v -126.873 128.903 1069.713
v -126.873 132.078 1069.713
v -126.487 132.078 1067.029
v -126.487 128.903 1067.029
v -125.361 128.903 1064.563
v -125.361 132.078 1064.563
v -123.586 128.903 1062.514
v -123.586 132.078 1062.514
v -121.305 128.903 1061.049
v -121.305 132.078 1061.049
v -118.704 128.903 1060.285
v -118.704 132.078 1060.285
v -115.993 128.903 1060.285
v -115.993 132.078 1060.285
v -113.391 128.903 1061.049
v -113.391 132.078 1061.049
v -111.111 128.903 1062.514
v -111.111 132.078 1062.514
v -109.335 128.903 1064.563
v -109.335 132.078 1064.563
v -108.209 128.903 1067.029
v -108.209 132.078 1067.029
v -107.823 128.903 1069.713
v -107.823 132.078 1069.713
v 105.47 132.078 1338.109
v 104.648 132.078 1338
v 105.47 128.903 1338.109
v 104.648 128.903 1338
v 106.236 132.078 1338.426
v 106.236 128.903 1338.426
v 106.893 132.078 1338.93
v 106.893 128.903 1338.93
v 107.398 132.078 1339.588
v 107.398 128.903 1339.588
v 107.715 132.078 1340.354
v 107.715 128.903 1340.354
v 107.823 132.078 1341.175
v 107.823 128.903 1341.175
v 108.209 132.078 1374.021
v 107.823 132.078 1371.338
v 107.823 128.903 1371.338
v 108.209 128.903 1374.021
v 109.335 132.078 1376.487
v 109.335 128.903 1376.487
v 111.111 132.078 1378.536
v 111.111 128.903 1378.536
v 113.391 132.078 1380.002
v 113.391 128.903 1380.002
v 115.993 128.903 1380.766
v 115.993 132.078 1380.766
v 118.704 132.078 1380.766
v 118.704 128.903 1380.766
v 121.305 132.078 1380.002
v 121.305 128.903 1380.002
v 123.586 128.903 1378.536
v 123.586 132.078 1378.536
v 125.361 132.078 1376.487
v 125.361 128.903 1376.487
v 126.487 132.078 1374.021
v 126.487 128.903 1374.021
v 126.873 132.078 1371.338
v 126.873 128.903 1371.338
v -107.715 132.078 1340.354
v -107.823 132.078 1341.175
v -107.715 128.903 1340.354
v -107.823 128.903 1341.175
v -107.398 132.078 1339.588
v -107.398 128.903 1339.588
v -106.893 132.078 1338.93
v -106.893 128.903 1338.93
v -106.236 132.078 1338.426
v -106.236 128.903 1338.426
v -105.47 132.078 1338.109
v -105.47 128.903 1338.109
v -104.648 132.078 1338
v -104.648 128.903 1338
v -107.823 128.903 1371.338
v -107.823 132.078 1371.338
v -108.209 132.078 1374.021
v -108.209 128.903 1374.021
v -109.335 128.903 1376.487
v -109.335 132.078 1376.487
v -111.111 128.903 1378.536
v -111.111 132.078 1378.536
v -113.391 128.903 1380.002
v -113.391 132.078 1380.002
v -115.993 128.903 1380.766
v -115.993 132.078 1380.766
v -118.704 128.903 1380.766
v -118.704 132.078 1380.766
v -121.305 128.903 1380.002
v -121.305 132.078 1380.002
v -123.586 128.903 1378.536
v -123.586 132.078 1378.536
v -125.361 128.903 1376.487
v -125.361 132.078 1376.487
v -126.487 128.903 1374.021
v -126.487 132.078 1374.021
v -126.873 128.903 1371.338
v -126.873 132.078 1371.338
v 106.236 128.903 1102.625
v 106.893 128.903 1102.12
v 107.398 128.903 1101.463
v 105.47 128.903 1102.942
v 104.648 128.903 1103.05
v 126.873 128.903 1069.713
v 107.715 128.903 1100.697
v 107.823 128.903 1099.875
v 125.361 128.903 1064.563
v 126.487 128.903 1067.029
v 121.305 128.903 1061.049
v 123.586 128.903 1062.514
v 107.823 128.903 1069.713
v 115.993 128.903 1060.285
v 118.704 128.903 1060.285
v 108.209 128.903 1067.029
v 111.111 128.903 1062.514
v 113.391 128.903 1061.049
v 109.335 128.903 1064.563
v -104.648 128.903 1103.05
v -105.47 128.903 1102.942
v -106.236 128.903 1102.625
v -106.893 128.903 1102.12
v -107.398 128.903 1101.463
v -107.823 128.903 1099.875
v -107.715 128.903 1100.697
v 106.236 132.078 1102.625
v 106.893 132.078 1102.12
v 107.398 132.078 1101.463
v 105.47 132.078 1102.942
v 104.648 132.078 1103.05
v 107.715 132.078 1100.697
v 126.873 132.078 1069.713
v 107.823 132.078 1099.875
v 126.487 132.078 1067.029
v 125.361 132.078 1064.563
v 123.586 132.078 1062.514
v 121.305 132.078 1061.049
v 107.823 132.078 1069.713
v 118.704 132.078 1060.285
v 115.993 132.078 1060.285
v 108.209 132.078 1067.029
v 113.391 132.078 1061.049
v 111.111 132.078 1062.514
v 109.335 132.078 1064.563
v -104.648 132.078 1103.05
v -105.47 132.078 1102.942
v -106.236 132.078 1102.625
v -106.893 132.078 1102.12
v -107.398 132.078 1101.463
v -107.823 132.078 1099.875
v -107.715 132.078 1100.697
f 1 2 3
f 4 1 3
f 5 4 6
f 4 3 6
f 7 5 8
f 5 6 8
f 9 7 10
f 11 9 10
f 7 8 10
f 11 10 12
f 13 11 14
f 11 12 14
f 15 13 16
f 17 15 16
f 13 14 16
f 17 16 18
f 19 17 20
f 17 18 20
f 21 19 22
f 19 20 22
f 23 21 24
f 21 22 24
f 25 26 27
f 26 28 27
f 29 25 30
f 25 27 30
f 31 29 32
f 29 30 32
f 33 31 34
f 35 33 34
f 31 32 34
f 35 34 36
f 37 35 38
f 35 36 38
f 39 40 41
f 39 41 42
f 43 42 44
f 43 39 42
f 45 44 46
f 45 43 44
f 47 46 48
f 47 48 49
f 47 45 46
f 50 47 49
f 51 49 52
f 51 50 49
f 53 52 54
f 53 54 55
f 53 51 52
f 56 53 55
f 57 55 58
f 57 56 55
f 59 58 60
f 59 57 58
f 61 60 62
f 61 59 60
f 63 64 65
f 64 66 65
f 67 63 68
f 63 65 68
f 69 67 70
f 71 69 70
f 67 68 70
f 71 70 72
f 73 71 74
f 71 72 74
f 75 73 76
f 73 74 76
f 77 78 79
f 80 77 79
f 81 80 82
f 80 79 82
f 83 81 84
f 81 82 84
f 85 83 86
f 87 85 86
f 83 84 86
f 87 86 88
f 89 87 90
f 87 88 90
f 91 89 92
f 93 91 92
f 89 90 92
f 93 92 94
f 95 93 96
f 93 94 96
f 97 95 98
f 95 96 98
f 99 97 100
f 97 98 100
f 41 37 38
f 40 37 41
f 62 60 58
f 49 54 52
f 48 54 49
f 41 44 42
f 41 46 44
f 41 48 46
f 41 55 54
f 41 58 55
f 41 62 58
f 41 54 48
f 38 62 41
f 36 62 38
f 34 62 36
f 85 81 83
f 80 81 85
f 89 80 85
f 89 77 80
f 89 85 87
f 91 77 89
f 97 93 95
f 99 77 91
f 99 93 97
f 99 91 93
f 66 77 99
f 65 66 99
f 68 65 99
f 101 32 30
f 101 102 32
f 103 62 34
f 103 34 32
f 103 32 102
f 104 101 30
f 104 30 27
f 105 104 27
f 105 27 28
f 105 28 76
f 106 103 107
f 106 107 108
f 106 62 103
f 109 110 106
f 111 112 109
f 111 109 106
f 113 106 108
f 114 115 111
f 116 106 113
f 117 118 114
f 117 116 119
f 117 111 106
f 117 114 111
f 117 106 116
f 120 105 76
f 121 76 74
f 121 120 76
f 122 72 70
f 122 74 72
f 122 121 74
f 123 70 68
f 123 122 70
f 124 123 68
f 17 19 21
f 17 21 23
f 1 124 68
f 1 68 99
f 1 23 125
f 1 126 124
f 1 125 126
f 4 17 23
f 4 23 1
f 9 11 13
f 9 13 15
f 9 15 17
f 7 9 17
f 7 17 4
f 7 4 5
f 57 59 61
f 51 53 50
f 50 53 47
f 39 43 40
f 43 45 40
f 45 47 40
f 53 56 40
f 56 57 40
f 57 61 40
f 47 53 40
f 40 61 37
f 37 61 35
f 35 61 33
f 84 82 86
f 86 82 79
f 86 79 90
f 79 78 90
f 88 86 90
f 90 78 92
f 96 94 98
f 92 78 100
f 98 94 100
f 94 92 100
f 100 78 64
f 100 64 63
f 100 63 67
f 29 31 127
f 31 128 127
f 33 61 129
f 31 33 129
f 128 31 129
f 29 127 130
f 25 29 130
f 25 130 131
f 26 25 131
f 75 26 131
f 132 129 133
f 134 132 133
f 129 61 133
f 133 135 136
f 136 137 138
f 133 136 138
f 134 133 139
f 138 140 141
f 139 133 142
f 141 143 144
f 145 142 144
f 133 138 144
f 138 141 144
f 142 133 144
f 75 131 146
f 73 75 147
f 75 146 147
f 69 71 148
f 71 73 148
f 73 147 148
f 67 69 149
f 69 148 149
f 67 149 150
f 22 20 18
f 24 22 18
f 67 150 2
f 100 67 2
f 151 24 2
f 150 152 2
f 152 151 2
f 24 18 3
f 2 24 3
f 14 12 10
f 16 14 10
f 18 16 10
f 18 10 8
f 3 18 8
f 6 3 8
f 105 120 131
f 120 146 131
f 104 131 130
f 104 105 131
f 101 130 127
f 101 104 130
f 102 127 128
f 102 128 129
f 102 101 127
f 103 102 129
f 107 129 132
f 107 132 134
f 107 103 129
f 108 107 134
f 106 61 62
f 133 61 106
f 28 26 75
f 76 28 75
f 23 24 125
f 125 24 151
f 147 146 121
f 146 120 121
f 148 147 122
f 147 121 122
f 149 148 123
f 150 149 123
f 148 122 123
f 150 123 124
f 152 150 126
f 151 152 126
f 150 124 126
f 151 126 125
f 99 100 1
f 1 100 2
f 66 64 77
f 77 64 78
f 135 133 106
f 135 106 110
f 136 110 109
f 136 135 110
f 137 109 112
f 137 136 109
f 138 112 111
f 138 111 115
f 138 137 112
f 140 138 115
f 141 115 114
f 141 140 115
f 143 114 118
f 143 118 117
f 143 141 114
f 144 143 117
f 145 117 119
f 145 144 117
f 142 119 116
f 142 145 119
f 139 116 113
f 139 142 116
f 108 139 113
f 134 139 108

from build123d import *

# Parameters (mm, degrees)
BOSS_EXTRUDE1_START = 12.827
BOSS_EXTRUDE1_DEPTH = 3.175
FILLET1_R           = 3.175


with BuildPart() as part:
    # Sketch1 → Boss-Extrude1 (new body)
    with BuildSketch(Plane(origin=(0, 144.904574554, 0), x_dir=(-1, 0, 0), z_dir=(0, -1, 0)).offset(BOSS_EXTRUDE1_START)):
        with BuildLine():
            Line((-107.823062484, -1103.050334154), (0, -1103.050334154))
            Line((0, -1103.050334154), (0, -1338.000334154))
            Line((0, -1338.000334154), (-107.823062484, -1338.000334154))
            Line((-107.823062484, -1338.000334154), (-107.823062484, -1371.337834154))
            ThreePointArc((-107.823062484, -1371.337834154), (-117.348062484, -1380.862834154), (-126.873062484, -1371.337834154))
            Line((-126.873062484, -1371.337834154), (-126.873062484, -1069.712834154))
            ThreePointArc((-126.873062484, -1069.712834154), (-117.348062484, -1060.187834154), (-107.823062484, -1069.712834154))
            Line((-107.823062484, -1069.712834154), (-107.823062484, -1103.050334154))
        make_face()
    extrude(amount=BOSS_EXTRUDE1_DEPTH)

    # Mirror1: part across plane


with BuildPart() as part_1:
    add(part.part)
    add(part.part.mirror(Plane(origin=(0, 0, 0), x_dir=(0, 0, 1), z_dir=(1, 0, 0))))

    # Fillet1
    fillet1_edges = [part_1.edges().sort_by_distance(p)[0] for p in [
        (107.823062484, 130.490074554, 1103.050334154),
        (107.823062484, 130.490074554, 1338.000334154),
        (-107.823062484, 130.490074554, 1338.000334154),
        (-107.823062484, 130.490074554, 1103.050334154),
    ]]
    fillet(fillet1_edges, radius=FILLET1_R)


solid = part_1.part
